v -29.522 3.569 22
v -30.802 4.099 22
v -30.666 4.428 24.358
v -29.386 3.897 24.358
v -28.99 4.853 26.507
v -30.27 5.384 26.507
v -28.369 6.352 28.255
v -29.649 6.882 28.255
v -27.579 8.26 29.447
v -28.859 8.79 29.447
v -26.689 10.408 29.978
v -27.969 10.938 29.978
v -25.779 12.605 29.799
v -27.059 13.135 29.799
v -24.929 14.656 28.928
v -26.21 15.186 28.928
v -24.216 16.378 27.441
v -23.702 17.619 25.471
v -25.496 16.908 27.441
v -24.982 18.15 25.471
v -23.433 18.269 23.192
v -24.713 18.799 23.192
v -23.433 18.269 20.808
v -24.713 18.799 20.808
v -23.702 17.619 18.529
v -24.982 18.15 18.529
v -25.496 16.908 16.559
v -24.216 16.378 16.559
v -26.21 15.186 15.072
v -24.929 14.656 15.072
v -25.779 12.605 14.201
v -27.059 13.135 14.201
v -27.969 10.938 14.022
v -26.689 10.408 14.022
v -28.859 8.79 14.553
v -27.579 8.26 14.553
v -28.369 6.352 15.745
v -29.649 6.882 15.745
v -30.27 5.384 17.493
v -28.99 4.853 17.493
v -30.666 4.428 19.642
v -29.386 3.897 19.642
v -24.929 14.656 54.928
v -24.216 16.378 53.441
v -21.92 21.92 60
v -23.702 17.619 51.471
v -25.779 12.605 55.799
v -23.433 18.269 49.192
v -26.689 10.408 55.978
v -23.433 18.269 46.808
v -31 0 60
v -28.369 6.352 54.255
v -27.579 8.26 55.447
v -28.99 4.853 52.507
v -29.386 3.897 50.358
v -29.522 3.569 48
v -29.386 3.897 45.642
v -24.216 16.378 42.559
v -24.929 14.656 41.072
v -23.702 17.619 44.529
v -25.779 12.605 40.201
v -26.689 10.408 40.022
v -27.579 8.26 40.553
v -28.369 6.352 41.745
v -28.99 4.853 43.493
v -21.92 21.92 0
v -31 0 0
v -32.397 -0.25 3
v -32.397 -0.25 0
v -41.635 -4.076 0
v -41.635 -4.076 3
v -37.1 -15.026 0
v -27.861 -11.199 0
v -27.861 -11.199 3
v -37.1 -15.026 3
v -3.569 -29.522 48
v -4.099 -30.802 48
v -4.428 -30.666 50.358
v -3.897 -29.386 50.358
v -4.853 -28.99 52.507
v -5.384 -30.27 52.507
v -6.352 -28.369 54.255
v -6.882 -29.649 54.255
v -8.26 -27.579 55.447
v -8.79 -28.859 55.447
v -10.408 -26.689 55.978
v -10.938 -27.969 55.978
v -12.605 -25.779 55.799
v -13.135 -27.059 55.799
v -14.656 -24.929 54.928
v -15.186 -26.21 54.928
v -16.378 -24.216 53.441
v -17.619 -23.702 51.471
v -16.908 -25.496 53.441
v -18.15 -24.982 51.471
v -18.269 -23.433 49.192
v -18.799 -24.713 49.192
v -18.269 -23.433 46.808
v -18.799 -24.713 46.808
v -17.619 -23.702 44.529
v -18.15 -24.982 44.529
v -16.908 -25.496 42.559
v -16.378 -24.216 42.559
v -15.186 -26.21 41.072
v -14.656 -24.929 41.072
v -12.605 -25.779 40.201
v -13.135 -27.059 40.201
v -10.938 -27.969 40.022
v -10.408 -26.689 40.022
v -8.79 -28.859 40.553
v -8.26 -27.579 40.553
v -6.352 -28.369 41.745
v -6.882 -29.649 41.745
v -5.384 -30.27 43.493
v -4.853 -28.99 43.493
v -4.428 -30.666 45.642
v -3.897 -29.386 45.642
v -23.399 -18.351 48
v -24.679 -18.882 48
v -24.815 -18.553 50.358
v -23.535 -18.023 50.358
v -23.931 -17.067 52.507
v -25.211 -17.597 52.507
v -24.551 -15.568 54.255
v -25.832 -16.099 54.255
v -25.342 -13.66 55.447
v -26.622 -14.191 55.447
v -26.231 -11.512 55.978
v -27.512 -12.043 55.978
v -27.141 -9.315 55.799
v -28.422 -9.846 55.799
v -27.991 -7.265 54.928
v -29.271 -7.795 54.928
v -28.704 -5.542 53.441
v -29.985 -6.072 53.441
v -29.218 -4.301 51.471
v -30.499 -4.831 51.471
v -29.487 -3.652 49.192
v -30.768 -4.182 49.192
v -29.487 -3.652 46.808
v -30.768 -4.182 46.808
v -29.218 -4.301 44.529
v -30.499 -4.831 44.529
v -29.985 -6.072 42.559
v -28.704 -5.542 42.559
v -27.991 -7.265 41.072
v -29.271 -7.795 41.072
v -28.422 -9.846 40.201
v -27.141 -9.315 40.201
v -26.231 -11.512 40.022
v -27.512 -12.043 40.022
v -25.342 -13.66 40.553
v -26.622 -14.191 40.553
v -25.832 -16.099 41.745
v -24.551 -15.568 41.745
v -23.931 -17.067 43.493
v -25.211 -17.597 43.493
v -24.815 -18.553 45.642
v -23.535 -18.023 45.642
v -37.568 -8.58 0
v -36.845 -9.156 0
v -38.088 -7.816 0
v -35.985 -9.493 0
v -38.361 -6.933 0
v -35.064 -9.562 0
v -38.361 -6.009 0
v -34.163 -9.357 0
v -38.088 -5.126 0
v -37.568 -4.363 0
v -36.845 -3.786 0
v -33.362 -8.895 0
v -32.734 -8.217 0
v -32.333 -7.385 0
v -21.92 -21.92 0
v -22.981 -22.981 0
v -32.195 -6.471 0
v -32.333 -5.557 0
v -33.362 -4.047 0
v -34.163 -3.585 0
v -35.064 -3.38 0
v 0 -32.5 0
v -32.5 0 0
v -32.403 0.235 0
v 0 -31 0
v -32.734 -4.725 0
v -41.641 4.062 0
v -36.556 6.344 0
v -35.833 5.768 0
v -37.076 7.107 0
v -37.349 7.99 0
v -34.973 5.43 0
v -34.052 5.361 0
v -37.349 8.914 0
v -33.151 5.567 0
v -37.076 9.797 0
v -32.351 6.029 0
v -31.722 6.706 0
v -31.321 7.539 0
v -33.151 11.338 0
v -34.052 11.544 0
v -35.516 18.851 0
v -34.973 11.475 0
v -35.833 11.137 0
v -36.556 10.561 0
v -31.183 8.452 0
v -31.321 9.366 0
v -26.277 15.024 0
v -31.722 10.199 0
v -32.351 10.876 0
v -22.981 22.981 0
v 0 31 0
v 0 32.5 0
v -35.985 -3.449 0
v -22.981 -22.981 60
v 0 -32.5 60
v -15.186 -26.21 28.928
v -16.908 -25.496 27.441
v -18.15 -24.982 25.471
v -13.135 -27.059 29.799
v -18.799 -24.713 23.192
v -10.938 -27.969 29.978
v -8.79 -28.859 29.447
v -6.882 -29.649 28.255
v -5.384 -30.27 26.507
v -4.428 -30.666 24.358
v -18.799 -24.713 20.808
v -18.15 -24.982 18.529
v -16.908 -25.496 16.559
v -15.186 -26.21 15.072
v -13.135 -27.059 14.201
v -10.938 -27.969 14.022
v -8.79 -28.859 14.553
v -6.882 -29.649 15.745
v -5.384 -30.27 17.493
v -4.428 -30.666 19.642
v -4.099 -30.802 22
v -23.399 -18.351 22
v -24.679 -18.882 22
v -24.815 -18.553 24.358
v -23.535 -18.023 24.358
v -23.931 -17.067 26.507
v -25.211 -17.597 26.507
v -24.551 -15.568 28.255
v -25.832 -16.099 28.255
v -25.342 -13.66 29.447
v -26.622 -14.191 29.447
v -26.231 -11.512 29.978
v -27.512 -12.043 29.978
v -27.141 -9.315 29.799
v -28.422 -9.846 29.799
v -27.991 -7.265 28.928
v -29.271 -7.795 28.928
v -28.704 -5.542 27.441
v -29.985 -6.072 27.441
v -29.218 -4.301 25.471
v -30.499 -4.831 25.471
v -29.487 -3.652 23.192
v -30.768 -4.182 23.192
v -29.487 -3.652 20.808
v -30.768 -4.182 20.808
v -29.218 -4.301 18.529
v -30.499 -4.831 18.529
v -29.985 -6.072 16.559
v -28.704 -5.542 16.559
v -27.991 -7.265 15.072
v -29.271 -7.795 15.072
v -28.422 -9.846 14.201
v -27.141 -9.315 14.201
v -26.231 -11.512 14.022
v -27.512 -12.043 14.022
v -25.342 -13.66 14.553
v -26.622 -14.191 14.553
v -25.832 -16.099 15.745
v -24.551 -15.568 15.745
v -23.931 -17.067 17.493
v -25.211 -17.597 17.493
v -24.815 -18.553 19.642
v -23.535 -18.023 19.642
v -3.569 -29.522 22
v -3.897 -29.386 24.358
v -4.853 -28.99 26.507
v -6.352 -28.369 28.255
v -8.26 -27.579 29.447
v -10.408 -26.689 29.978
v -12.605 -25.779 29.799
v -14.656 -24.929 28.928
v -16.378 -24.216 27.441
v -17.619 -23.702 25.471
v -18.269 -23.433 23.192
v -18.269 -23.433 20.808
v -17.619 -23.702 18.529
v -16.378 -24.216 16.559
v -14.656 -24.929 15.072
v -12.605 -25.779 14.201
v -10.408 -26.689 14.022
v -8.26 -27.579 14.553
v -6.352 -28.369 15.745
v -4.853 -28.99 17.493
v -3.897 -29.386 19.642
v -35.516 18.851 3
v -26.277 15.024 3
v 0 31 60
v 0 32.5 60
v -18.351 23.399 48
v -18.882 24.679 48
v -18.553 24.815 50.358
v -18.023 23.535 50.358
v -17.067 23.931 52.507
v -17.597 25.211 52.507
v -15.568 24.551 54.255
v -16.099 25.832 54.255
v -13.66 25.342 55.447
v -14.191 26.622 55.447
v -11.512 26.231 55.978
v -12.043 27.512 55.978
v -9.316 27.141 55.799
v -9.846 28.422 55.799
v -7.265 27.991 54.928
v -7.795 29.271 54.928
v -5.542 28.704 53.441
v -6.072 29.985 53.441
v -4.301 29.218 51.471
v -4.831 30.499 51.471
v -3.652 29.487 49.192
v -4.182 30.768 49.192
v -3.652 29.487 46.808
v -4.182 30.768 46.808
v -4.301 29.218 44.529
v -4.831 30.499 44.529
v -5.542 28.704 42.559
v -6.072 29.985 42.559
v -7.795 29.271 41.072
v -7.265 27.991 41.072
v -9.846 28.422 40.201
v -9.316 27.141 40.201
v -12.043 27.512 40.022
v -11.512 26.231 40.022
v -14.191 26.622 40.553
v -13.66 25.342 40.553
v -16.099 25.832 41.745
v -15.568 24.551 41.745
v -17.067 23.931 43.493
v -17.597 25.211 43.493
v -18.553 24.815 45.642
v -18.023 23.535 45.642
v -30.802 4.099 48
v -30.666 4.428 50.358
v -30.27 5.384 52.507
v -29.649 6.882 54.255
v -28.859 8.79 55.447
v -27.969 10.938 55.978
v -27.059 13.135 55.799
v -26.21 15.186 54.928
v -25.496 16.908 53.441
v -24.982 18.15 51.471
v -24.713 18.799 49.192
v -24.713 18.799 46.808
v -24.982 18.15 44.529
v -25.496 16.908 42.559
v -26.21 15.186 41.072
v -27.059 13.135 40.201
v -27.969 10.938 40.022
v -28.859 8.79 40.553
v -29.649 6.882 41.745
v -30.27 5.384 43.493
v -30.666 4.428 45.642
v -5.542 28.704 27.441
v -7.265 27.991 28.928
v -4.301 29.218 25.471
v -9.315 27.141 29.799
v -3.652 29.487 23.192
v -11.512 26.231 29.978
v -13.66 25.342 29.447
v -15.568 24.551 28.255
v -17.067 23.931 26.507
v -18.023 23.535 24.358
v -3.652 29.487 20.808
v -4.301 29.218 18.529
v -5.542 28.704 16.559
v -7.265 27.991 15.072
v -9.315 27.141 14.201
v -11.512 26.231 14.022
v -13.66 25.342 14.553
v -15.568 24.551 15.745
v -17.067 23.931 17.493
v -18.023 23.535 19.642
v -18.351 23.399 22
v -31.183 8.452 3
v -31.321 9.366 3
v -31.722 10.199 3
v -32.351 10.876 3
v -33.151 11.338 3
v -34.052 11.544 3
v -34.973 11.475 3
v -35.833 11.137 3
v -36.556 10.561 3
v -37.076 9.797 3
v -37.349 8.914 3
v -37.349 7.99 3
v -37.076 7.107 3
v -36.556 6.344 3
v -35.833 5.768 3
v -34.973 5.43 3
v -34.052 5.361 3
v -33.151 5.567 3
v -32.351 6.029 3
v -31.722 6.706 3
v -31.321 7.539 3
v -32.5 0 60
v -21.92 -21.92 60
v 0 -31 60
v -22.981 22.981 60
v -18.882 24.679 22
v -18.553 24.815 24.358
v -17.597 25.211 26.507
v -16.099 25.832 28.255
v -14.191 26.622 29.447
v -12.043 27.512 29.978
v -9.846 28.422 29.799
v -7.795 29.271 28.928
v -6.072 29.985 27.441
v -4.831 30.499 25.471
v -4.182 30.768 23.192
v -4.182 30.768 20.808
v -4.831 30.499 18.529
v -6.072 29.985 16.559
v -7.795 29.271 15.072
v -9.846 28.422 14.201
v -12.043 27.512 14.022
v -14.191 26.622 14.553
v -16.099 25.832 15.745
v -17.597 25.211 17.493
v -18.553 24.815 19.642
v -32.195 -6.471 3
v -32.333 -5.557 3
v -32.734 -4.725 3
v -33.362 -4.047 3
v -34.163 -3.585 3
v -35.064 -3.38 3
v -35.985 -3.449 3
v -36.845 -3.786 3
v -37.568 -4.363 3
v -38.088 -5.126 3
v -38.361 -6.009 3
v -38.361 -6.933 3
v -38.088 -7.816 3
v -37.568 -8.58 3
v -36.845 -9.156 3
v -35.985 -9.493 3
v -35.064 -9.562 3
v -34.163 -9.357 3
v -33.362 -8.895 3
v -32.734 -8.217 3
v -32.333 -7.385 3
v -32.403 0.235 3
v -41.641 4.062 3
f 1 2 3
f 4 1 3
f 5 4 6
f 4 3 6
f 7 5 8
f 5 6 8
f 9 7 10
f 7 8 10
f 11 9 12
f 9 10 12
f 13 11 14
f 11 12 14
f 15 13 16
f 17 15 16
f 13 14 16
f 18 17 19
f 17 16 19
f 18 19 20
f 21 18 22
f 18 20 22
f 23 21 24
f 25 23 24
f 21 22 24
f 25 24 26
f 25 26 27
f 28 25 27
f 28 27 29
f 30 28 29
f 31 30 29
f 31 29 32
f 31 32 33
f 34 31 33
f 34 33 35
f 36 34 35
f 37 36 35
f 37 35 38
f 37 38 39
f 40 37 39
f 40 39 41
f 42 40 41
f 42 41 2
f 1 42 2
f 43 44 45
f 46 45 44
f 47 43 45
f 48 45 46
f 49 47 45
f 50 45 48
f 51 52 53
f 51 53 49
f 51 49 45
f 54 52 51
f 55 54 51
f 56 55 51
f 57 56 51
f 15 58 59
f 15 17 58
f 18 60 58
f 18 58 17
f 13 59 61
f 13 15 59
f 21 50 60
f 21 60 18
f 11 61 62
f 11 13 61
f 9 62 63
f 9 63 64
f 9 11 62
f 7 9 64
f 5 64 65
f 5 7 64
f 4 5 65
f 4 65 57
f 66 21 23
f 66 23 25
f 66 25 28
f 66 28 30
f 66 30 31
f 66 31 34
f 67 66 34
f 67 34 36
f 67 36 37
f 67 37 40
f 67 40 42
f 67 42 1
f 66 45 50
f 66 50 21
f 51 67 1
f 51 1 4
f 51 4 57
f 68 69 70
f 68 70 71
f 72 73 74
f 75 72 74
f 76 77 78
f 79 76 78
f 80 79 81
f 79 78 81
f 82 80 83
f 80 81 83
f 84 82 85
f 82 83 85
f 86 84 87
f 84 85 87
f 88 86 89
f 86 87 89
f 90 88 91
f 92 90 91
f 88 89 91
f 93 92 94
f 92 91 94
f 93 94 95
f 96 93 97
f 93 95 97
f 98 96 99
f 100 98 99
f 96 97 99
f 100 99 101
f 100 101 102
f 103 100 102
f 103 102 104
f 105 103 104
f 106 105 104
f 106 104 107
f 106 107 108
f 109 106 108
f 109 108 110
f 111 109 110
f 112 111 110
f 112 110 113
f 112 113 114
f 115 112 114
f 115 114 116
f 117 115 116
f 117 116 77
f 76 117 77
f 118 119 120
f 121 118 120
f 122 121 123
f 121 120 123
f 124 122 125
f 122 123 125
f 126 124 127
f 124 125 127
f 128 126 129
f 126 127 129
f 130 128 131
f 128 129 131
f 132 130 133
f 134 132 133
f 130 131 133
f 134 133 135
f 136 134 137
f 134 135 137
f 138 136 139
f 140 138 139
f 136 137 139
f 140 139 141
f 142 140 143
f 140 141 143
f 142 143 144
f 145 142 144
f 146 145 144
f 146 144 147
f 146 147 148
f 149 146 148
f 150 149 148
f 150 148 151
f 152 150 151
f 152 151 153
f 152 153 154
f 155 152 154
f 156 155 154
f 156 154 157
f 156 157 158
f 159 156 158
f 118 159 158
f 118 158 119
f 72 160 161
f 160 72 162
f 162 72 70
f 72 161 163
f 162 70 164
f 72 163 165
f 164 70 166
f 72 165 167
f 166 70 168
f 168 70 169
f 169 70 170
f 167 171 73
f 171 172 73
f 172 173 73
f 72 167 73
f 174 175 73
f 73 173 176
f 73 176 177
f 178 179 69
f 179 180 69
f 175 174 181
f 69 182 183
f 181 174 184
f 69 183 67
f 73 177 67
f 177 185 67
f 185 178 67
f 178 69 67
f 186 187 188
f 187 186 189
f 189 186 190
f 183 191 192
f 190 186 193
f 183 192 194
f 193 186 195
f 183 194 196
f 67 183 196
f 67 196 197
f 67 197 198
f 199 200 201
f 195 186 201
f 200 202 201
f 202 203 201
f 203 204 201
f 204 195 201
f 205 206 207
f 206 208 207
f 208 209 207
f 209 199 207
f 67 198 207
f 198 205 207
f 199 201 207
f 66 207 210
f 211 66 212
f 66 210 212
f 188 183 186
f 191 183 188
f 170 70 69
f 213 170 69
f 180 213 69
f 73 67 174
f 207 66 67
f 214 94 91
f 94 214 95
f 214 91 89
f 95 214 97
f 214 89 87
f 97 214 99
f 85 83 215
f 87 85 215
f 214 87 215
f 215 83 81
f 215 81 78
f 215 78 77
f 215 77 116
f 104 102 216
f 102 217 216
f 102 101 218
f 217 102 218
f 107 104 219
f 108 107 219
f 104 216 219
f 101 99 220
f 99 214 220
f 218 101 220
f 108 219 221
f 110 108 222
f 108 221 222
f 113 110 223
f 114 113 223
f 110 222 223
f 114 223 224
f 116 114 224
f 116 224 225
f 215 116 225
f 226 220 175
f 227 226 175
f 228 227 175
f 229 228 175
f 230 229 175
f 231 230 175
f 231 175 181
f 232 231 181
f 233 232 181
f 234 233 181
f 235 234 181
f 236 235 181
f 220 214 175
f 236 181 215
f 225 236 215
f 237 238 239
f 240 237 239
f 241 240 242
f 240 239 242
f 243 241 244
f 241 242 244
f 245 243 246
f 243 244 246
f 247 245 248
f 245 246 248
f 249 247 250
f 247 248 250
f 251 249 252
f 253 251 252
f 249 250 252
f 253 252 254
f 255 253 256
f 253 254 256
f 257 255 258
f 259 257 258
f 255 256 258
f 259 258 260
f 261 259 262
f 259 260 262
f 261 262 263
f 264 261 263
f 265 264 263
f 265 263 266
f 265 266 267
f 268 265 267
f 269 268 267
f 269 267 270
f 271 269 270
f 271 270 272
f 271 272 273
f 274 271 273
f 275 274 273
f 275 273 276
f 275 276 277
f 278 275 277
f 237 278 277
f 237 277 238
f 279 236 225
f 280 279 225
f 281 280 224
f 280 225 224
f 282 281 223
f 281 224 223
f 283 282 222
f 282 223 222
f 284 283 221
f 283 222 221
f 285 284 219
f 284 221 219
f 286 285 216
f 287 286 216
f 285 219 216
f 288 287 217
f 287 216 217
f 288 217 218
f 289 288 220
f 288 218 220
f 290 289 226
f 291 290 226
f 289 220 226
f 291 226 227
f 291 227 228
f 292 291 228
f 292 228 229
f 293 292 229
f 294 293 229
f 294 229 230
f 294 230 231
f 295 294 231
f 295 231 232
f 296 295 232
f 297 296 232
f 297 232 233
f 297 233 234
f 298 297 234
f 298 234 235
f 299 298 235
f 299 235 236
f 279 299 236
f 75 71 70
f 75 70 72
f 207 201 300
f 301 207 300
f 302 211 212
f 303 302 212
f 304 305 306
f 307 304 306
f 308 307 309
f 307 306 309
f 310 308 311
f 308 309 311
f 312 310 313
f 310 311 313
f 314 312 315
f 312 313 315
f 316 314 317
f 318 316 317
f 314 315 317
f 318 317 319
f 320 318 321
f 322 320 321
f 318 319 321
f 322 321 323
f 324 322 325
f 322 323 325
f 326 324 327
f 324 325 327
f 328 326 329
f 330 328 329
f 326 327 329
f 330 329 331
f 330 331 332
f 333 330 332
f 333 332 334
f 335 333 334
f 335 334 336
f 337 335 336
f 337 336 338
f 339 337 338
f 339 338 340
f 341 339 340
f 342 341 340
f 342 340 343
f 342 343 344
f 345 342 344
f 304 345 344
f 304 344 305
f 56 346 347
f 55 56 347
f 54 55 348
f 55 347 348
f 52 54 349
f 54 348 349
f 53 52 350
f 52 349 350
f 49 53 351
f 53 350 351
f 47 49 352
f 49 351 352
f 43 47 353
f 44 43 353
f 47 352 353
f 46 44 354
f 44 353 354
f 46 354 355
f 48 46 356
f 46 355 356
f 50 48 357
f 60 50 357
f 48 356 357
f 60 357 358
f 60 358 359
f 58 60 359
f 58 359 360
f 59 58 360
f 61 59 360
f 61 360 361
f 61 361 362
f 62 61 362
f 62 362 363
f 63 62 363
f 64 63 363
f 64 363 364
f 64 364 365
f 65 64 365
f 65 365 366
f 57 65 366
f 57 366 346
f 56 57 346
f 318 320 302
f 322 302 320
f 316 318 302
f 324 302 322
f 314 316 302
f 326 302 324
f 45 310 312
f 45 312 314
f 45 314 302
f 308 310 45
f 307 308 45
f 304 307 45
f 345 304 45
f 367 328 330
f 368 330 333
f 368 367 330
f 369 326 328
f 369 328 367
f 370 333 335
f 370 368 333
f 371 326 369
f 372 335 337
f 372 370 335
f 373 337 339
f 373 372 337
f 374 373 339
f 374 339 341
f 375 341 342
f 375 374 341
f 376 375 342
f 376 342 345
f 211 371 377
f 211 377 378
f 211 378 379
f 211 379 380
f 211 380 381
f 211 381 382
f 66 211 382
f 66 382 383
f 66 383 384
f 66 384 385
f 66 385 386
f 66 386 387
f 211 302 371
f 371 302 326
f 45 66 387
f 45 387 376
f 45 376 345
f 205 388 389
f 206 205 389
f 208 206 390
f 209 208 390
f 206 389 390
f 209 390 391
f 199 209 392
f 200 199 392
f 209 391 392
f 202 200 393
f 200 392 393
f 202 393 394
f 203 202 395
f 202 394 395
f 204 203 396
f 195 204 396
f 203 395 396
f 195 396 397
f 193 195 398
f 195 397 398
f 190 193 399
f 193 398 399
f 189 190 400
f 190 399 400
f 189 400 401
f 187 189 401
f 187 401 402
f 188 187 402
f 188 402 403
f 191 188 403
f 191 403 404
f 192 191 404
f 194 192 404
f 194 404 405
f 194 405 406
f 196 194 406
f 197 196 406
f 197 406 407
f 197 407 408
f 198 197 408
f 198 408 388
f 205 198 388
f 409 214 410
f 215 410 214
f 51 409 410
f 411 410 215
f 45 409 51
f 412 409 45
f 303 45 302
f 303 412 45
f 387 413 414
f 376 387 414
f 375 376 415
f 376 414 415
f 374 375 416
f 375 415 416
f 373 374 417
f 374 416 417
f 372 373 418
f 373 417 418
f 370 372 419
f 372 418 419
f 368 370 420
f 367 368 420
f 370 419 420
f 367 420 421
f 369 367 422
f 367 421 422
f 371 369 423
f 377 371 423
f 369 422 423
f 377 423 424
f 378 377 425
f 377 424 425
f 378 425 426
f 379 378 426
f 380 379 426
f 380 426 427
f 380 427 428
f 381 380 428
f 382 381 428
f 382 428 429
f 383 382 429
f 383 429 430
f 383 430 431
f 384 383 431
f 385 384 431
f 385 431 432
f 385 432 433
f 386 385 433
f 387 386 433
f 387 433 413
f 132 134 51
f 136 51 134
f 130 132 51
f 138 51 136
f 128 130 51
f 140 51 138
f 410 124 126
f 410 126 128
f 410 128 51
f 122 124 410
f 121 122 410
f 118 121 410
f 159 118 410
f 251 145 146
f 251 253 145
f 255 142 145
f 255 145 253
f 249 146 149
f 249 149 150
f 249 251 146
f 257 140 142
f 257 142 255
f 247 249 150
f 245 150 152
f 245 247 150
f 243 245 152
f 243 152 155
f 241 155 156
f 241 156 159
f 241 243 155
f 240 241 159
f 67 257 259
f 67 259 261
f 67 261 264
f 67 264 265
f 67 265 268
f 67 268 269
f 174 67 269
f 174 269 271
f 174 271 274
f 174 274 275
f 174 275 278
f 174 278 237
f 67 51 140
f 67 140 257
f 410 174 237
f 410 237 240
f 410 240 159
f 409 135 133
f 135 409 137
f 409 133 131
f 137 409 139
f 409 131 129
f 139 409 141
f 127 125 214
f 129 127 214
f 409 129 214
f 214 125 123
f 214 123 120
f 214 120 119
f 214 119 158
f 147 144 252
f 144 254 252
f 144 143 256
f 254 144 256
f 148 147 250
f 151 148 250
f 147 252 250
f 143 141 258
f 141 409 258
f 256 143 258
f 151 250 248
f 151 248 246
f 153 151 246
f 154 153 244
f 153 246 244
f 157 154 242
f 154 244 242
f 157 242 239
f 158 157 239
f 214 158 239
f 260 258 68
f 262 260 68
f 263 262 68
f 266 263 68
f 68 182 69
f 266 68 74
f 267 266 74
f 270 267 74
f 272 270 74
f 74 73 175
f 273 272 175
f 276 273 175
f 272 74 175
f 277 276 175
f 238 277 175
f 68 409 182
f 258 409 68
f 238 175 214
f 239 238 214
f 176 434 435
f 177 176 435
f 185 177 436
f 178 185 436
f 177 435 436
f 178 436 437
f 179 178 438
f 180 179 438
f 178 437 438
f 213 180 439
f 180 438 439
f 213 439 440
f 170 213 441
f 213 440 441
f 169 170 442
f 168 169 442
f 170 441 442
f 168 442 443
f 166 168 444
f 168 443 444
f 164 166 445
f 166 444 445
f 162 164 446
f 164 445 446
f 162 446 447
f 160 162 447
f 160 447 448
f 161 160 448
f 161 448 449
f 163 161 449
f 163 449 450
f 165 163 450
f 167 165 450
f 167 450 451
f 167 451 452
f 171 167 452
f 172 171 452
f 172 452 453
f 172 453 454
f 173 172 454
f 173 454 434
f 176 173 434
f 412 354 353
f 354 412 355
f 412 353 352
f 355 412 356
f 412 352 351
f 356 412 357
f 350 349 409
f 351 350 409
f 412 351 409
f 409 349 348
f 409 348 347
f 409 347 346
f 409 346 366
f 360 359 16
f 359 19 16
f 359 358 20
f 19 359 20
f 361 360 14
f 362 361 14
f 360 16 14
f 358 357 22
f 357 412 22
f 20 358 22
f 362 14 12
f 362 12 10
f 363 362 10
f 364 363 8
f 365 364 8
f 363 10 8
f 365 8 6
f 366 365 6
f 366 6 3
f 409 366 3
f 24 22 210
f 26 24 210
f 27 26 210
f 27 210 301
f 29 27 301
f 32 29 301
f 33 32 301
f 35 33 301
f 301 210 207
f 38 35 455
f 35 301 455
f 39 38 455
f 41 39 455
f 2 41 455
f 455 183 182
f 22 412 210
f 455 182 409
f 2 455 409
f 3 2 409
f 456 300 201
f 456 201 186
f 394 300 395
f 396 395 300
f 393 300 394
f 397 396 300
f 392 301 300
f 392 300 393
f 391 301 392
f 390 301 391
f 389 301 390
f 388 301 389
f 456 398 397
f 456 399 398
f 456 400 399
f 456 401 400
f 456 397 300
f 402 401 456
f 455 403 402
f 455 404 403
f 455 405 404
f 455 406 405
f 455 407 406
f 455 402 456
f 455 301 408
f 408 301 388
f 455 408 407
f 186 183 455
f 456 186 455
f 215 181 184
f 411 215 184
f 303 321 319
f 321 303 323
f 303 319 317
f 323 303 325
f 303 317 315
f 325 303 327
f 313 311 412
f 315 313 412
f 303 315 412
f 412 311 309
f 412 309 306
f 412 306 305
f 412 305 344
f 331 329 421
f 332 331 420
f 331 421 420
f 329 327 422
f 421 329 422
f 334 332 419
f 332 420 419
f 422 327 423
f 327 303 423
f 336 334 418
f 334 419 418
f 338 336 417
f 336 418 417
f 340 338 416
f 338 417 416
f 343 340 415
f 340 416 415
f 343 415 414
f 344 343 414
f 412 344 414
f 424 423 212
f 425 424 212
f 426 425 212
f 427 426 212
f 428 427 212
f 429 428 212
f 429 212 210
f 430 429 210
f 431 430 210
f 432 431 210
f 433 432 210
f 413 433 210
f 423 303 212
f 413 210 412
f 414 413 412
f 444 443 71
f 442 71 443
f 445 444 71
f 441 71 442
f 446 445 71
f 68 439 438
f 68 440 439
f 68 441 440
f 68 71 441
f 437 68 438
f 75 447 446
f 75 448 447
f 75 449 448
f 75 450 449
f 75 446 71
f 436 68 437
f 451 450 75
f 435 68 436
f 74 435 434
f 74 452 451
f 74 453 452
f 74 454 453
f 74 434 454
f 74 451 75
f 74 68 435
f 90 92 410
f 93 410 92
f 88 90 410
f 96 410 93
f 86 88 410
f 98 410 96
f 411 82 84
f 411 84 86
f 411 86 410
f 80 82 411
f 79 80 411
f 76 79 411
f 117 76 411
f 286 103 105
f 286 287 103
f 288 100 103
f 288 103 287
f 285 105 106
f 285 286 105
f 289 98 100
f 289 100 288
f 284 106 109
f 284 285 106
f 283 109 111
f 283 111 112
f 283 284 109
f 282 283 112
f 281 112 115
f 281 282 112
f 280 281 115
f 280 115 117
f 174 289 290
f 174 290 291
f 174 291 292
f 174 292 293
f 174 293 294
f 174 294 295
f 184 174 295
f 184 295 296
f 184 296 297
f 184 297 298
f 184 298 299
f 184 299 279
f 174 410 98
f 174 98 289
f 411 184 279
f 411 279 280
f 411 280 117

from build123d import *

# Parameters (mm, degrees)
BOX_W           = 60
BOX_H           = 70
BOX_DEPTH       = 60
PRISM001_DEPTH  = 60
PRISM_DEPTH     = 60
SKETCH_R        = 8
POCKET_DEPTH    = 2
SKETCH001_R     = 8
POCKET001_DEPTH = 2
SKETCH002_R     = 8
POCKET002_DEPTH = 2
SKETCH003_R     = 8
POCKET003_DEPTH = 2
SKETCH004_W     = 16.007478
SKETCH004_H     = 3
PAD_DEPTH       = 10
SKETCH005_W     = 11.852036
SKETCH005_H     = 3
PAD001_DEPTH    = 10
SKETCH006_R     = 3.1
POCKET004_DEPTH = 5
SKETCH007_R     = 3.1
POCKET005_DEPTH = 5


with BuildPart() as cubo:
    # Box → Box (new body)
    with BuildSketch(Plane(origin=(0, -35, 0), x_dir=(1, 0, 0), z_dir=(0, 0, 1))):
        with Locations((30, 35)):
            Rectangle(BOX_W, BOX_H)
    extrude(amount=BOX_DEPTH)


with BuildPart() as prisma001:
    # Prism001 → Prism001 (new body)
    with BuildSketch(Plane.XY):
        Polygon((31, 0), (21.9203102168, 21.9203102168), (0, 31), (-21.9203102168, 21.9203102168), (-31, 0), (-21.9203102168, -21.9203102168), (0, -31), (21.9203102168, -21.9203102168), align=None)
    extrude(amount=PRISM001_DEPTH)


with BuildPart() as pocket005:
    # Prism → Prism (new body)
    with BuildSketch(Plane.XY):
        Polygon((32.5, 0), (22.9809703886, 22.9809703886), (0, 32.5), (-22.9809703886, 22.9809703886), (-32.5, 0), (-22.9809703886, -22.9809703886), (0, -32.5), (22.9809703886, -22.9809703886), align=None)
    extrude(amount=PRISM_DEPTH)

    # Cut: cut Prisma001
    add(prisma001.part, mode=Mode.SUBTRACT)

    # Cut001: cut Cubo
    add(cubo.part, mode=Mode.SUBTRACT)

    # Sketch → Pocket (cut)
    with BuildSketch(Plane(origin=(-11.4904851943, -27.7404851943, 0), x_dir=(0.9238795325, -0.3826834324, 0), z_dir=(-0.3826834324, -0.9238795325, 0))):
        with Locations((0, 48)):
            Circle(SKETCH_R)
        with Locations((0, 22)):
            Circle(SKETCH_R)
    extrude(amount=-POCKET_DEPTH, mode=Mode.SUBTRACT)

    # Sketch001 → Pocket001 (cut)
    with BuildSketch(Plane(origin=(-27.7404851943, -11.4904851943, 0), x_dir=(0.3826834324, -0.9238795325, 0), z_dir=(-0.9238795325, -0.3826834324, 0))):
        with Locations((0, 48)):
            Circle(SKETCH001_R)
        with Locations((0, 22)):
            Circle(SKETCH001_R)
    extrude(amount=-POCKET001_DEPTH, mode=Mode.SUBTRACT)

    # Sketch002 → Pocket002 (cut)
    with BuildSketch(Plane(origin=(-27.7404851943, 11.4904851943, 0), x_dir=(-0.3826834324, -0.9238795325, 0), z_dir=(-0.9238795325, 0.3826834324, 0))):
        with Locations((0, 48)):
            Circle(SKETCH002_R)
        with Locations((0, 22)):
            Circle(SKETCH002_R)
    extrude(amount=-POCKET002_DEPTH, mode=Mode.SUBTRACT)

    # Sketch003 → Pocket003 (cut)
    with BuildSketch(Plane(origin=(-11.4904851943, 27.7404851943, 0), x_dir=(-0.9238795325, -0.3826834324, 0), z_dir=(-0.3826834324, 0.9238795325, 0))):
        with Locations((6e-06, 48)):
            Circle(SKETCH003_R)
        with Locations((0, 22)):
            Circle(SKETCH003_R)
    extrude(amount=-POCKET003_DEPTH, mode=Mode.SUBTRACT)

    # Sketch004 → Pad (new body)
    with BuildSketch(Plane(origin=(-27.7404851943, 11.4904851943, 0), x_dir=(-0.3826834324, -0.9238795325, 0), z_dir=(-0.9238795325, 0.3826834324, 0))):
        with Locations((4.178784, 1.5)):
            Rectangle(SKETCH004_W, SKETCH004_H)
    extrude(amount=PAD_DEPTH)

    # Sketch005 → Pad001 (new body)
    with BuildSketch(Plane(origin=(-27.7404851943, -11.4904851943, 0), x_dir=(0.3826834324, -0.9238795325, 0), z_dir=(-0.9238795325, -0.3826834324, 0))):
        with Locations((-6.240987, 1.5)):
            Rectangle(SKETCH005_W, SKETCH005_H)
    extrude(amount=PAD001_DEPTH)

    # Sketch006 → Pocket004 (cut)
    with BuildSketch(Plane.XY.offset(3)):
        with Locations((-34.283413, 8.452291)):
            Circle(SKETCH006_R)
    extrude(amount=-POCKET004_DEPTH, mode=Mode.SUBTRACT)

    # Sketch007 → Pocket005 (cut)
    with BuildSketch(Plane.XY.offset(3)):
        with Locations((-35.295174, -6.471159)):
            Circle(SKETCH007_R)
    extrude(amount=-POCKET005_DEPTH, mode=Mode.SUBTRACT)


solid = pocket005.part
